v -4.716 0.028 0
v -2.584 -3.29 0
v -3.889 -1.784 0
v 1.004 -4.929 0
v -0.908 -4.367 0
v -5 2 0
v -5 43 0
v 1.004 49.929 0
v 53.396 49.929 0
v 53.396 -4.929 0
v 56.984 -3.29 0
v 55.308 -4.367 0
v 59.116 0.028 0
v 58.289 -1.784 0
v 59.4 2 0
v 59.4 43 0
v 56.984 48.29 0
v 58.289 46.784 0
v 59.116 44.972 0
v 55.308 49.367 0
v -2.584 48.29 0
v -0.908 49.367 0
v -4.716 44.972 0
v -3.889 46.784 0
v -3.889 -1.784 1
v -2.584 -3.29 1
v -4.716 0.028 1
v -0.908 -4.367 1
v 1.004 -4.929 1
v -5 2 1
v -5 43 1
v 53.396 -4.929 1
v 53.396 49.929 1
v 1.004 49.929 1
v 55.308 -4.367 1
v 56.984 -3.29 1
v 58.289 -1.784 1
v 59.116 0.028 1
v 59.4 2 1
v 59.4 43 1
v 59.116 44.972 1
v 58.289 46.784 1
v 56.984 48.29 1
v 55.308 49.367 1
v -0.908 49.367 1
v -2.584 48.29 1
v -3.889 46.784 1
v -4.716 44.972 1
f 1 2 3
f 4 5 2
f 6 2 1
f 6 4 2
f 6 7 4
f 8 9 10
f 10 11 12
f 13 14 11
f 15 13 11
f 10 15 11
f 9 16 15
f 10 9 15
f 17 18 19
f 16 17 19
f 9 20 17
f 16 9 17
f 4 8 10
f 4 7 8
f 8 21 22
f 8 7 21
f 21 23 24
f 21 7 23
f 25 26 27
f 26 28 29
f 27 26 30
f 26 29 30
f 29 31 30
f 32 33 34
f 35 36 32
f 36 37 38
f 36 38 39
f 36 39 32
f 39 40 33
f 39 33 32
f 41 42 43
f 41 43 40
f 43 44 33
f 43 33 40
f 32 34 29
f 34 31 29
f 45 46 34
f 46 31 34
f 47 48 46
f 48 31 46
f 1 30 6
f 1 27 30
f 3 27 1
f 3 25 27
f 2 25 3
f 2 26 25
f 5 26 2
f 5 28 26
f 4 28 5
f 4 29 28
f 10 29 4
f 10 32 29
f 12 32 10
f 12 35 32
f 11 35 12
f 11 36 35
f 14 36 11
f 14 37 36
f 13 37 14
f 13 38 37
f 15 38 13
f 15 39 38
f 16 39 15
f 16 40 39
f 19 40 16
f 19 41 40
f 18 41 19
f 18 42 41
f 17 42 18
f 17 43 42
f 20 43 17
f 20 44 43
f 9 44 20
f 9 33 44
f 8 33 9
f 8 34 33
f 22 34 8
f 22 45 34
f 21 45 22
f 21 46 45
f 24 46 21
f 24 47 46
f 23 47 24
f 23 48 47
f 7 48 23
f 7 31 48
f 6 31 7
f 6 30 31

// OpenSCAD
a=10;
linear_extrude(height=1)translate([64.4/2-a/2,55/2-a/2])round_square(x=54.4+a,y=45+a,r=7);
linear_extrude(height=2)translate([-0.8,-1.2])import("teilfabriko.dxf");

module round_square(x,y=0,r=0) {
    if(y==0) {
        hull()tr_xy(x=x/2-r)circle(r=r);
    } else {
        hull()tr_xy(x=x/2-r,y=y/2-r)circle(r=r);
    }
}
module tr_xy(x,y=0) {
	if(y==0) {
		for(i=[-1,1])for(j=[-1,1])translate([x*i,x*j])children();
	} else {
		for(i=[-1,1])for(j=[-1,1])translate([x*i,y*j])children();
	}
}
